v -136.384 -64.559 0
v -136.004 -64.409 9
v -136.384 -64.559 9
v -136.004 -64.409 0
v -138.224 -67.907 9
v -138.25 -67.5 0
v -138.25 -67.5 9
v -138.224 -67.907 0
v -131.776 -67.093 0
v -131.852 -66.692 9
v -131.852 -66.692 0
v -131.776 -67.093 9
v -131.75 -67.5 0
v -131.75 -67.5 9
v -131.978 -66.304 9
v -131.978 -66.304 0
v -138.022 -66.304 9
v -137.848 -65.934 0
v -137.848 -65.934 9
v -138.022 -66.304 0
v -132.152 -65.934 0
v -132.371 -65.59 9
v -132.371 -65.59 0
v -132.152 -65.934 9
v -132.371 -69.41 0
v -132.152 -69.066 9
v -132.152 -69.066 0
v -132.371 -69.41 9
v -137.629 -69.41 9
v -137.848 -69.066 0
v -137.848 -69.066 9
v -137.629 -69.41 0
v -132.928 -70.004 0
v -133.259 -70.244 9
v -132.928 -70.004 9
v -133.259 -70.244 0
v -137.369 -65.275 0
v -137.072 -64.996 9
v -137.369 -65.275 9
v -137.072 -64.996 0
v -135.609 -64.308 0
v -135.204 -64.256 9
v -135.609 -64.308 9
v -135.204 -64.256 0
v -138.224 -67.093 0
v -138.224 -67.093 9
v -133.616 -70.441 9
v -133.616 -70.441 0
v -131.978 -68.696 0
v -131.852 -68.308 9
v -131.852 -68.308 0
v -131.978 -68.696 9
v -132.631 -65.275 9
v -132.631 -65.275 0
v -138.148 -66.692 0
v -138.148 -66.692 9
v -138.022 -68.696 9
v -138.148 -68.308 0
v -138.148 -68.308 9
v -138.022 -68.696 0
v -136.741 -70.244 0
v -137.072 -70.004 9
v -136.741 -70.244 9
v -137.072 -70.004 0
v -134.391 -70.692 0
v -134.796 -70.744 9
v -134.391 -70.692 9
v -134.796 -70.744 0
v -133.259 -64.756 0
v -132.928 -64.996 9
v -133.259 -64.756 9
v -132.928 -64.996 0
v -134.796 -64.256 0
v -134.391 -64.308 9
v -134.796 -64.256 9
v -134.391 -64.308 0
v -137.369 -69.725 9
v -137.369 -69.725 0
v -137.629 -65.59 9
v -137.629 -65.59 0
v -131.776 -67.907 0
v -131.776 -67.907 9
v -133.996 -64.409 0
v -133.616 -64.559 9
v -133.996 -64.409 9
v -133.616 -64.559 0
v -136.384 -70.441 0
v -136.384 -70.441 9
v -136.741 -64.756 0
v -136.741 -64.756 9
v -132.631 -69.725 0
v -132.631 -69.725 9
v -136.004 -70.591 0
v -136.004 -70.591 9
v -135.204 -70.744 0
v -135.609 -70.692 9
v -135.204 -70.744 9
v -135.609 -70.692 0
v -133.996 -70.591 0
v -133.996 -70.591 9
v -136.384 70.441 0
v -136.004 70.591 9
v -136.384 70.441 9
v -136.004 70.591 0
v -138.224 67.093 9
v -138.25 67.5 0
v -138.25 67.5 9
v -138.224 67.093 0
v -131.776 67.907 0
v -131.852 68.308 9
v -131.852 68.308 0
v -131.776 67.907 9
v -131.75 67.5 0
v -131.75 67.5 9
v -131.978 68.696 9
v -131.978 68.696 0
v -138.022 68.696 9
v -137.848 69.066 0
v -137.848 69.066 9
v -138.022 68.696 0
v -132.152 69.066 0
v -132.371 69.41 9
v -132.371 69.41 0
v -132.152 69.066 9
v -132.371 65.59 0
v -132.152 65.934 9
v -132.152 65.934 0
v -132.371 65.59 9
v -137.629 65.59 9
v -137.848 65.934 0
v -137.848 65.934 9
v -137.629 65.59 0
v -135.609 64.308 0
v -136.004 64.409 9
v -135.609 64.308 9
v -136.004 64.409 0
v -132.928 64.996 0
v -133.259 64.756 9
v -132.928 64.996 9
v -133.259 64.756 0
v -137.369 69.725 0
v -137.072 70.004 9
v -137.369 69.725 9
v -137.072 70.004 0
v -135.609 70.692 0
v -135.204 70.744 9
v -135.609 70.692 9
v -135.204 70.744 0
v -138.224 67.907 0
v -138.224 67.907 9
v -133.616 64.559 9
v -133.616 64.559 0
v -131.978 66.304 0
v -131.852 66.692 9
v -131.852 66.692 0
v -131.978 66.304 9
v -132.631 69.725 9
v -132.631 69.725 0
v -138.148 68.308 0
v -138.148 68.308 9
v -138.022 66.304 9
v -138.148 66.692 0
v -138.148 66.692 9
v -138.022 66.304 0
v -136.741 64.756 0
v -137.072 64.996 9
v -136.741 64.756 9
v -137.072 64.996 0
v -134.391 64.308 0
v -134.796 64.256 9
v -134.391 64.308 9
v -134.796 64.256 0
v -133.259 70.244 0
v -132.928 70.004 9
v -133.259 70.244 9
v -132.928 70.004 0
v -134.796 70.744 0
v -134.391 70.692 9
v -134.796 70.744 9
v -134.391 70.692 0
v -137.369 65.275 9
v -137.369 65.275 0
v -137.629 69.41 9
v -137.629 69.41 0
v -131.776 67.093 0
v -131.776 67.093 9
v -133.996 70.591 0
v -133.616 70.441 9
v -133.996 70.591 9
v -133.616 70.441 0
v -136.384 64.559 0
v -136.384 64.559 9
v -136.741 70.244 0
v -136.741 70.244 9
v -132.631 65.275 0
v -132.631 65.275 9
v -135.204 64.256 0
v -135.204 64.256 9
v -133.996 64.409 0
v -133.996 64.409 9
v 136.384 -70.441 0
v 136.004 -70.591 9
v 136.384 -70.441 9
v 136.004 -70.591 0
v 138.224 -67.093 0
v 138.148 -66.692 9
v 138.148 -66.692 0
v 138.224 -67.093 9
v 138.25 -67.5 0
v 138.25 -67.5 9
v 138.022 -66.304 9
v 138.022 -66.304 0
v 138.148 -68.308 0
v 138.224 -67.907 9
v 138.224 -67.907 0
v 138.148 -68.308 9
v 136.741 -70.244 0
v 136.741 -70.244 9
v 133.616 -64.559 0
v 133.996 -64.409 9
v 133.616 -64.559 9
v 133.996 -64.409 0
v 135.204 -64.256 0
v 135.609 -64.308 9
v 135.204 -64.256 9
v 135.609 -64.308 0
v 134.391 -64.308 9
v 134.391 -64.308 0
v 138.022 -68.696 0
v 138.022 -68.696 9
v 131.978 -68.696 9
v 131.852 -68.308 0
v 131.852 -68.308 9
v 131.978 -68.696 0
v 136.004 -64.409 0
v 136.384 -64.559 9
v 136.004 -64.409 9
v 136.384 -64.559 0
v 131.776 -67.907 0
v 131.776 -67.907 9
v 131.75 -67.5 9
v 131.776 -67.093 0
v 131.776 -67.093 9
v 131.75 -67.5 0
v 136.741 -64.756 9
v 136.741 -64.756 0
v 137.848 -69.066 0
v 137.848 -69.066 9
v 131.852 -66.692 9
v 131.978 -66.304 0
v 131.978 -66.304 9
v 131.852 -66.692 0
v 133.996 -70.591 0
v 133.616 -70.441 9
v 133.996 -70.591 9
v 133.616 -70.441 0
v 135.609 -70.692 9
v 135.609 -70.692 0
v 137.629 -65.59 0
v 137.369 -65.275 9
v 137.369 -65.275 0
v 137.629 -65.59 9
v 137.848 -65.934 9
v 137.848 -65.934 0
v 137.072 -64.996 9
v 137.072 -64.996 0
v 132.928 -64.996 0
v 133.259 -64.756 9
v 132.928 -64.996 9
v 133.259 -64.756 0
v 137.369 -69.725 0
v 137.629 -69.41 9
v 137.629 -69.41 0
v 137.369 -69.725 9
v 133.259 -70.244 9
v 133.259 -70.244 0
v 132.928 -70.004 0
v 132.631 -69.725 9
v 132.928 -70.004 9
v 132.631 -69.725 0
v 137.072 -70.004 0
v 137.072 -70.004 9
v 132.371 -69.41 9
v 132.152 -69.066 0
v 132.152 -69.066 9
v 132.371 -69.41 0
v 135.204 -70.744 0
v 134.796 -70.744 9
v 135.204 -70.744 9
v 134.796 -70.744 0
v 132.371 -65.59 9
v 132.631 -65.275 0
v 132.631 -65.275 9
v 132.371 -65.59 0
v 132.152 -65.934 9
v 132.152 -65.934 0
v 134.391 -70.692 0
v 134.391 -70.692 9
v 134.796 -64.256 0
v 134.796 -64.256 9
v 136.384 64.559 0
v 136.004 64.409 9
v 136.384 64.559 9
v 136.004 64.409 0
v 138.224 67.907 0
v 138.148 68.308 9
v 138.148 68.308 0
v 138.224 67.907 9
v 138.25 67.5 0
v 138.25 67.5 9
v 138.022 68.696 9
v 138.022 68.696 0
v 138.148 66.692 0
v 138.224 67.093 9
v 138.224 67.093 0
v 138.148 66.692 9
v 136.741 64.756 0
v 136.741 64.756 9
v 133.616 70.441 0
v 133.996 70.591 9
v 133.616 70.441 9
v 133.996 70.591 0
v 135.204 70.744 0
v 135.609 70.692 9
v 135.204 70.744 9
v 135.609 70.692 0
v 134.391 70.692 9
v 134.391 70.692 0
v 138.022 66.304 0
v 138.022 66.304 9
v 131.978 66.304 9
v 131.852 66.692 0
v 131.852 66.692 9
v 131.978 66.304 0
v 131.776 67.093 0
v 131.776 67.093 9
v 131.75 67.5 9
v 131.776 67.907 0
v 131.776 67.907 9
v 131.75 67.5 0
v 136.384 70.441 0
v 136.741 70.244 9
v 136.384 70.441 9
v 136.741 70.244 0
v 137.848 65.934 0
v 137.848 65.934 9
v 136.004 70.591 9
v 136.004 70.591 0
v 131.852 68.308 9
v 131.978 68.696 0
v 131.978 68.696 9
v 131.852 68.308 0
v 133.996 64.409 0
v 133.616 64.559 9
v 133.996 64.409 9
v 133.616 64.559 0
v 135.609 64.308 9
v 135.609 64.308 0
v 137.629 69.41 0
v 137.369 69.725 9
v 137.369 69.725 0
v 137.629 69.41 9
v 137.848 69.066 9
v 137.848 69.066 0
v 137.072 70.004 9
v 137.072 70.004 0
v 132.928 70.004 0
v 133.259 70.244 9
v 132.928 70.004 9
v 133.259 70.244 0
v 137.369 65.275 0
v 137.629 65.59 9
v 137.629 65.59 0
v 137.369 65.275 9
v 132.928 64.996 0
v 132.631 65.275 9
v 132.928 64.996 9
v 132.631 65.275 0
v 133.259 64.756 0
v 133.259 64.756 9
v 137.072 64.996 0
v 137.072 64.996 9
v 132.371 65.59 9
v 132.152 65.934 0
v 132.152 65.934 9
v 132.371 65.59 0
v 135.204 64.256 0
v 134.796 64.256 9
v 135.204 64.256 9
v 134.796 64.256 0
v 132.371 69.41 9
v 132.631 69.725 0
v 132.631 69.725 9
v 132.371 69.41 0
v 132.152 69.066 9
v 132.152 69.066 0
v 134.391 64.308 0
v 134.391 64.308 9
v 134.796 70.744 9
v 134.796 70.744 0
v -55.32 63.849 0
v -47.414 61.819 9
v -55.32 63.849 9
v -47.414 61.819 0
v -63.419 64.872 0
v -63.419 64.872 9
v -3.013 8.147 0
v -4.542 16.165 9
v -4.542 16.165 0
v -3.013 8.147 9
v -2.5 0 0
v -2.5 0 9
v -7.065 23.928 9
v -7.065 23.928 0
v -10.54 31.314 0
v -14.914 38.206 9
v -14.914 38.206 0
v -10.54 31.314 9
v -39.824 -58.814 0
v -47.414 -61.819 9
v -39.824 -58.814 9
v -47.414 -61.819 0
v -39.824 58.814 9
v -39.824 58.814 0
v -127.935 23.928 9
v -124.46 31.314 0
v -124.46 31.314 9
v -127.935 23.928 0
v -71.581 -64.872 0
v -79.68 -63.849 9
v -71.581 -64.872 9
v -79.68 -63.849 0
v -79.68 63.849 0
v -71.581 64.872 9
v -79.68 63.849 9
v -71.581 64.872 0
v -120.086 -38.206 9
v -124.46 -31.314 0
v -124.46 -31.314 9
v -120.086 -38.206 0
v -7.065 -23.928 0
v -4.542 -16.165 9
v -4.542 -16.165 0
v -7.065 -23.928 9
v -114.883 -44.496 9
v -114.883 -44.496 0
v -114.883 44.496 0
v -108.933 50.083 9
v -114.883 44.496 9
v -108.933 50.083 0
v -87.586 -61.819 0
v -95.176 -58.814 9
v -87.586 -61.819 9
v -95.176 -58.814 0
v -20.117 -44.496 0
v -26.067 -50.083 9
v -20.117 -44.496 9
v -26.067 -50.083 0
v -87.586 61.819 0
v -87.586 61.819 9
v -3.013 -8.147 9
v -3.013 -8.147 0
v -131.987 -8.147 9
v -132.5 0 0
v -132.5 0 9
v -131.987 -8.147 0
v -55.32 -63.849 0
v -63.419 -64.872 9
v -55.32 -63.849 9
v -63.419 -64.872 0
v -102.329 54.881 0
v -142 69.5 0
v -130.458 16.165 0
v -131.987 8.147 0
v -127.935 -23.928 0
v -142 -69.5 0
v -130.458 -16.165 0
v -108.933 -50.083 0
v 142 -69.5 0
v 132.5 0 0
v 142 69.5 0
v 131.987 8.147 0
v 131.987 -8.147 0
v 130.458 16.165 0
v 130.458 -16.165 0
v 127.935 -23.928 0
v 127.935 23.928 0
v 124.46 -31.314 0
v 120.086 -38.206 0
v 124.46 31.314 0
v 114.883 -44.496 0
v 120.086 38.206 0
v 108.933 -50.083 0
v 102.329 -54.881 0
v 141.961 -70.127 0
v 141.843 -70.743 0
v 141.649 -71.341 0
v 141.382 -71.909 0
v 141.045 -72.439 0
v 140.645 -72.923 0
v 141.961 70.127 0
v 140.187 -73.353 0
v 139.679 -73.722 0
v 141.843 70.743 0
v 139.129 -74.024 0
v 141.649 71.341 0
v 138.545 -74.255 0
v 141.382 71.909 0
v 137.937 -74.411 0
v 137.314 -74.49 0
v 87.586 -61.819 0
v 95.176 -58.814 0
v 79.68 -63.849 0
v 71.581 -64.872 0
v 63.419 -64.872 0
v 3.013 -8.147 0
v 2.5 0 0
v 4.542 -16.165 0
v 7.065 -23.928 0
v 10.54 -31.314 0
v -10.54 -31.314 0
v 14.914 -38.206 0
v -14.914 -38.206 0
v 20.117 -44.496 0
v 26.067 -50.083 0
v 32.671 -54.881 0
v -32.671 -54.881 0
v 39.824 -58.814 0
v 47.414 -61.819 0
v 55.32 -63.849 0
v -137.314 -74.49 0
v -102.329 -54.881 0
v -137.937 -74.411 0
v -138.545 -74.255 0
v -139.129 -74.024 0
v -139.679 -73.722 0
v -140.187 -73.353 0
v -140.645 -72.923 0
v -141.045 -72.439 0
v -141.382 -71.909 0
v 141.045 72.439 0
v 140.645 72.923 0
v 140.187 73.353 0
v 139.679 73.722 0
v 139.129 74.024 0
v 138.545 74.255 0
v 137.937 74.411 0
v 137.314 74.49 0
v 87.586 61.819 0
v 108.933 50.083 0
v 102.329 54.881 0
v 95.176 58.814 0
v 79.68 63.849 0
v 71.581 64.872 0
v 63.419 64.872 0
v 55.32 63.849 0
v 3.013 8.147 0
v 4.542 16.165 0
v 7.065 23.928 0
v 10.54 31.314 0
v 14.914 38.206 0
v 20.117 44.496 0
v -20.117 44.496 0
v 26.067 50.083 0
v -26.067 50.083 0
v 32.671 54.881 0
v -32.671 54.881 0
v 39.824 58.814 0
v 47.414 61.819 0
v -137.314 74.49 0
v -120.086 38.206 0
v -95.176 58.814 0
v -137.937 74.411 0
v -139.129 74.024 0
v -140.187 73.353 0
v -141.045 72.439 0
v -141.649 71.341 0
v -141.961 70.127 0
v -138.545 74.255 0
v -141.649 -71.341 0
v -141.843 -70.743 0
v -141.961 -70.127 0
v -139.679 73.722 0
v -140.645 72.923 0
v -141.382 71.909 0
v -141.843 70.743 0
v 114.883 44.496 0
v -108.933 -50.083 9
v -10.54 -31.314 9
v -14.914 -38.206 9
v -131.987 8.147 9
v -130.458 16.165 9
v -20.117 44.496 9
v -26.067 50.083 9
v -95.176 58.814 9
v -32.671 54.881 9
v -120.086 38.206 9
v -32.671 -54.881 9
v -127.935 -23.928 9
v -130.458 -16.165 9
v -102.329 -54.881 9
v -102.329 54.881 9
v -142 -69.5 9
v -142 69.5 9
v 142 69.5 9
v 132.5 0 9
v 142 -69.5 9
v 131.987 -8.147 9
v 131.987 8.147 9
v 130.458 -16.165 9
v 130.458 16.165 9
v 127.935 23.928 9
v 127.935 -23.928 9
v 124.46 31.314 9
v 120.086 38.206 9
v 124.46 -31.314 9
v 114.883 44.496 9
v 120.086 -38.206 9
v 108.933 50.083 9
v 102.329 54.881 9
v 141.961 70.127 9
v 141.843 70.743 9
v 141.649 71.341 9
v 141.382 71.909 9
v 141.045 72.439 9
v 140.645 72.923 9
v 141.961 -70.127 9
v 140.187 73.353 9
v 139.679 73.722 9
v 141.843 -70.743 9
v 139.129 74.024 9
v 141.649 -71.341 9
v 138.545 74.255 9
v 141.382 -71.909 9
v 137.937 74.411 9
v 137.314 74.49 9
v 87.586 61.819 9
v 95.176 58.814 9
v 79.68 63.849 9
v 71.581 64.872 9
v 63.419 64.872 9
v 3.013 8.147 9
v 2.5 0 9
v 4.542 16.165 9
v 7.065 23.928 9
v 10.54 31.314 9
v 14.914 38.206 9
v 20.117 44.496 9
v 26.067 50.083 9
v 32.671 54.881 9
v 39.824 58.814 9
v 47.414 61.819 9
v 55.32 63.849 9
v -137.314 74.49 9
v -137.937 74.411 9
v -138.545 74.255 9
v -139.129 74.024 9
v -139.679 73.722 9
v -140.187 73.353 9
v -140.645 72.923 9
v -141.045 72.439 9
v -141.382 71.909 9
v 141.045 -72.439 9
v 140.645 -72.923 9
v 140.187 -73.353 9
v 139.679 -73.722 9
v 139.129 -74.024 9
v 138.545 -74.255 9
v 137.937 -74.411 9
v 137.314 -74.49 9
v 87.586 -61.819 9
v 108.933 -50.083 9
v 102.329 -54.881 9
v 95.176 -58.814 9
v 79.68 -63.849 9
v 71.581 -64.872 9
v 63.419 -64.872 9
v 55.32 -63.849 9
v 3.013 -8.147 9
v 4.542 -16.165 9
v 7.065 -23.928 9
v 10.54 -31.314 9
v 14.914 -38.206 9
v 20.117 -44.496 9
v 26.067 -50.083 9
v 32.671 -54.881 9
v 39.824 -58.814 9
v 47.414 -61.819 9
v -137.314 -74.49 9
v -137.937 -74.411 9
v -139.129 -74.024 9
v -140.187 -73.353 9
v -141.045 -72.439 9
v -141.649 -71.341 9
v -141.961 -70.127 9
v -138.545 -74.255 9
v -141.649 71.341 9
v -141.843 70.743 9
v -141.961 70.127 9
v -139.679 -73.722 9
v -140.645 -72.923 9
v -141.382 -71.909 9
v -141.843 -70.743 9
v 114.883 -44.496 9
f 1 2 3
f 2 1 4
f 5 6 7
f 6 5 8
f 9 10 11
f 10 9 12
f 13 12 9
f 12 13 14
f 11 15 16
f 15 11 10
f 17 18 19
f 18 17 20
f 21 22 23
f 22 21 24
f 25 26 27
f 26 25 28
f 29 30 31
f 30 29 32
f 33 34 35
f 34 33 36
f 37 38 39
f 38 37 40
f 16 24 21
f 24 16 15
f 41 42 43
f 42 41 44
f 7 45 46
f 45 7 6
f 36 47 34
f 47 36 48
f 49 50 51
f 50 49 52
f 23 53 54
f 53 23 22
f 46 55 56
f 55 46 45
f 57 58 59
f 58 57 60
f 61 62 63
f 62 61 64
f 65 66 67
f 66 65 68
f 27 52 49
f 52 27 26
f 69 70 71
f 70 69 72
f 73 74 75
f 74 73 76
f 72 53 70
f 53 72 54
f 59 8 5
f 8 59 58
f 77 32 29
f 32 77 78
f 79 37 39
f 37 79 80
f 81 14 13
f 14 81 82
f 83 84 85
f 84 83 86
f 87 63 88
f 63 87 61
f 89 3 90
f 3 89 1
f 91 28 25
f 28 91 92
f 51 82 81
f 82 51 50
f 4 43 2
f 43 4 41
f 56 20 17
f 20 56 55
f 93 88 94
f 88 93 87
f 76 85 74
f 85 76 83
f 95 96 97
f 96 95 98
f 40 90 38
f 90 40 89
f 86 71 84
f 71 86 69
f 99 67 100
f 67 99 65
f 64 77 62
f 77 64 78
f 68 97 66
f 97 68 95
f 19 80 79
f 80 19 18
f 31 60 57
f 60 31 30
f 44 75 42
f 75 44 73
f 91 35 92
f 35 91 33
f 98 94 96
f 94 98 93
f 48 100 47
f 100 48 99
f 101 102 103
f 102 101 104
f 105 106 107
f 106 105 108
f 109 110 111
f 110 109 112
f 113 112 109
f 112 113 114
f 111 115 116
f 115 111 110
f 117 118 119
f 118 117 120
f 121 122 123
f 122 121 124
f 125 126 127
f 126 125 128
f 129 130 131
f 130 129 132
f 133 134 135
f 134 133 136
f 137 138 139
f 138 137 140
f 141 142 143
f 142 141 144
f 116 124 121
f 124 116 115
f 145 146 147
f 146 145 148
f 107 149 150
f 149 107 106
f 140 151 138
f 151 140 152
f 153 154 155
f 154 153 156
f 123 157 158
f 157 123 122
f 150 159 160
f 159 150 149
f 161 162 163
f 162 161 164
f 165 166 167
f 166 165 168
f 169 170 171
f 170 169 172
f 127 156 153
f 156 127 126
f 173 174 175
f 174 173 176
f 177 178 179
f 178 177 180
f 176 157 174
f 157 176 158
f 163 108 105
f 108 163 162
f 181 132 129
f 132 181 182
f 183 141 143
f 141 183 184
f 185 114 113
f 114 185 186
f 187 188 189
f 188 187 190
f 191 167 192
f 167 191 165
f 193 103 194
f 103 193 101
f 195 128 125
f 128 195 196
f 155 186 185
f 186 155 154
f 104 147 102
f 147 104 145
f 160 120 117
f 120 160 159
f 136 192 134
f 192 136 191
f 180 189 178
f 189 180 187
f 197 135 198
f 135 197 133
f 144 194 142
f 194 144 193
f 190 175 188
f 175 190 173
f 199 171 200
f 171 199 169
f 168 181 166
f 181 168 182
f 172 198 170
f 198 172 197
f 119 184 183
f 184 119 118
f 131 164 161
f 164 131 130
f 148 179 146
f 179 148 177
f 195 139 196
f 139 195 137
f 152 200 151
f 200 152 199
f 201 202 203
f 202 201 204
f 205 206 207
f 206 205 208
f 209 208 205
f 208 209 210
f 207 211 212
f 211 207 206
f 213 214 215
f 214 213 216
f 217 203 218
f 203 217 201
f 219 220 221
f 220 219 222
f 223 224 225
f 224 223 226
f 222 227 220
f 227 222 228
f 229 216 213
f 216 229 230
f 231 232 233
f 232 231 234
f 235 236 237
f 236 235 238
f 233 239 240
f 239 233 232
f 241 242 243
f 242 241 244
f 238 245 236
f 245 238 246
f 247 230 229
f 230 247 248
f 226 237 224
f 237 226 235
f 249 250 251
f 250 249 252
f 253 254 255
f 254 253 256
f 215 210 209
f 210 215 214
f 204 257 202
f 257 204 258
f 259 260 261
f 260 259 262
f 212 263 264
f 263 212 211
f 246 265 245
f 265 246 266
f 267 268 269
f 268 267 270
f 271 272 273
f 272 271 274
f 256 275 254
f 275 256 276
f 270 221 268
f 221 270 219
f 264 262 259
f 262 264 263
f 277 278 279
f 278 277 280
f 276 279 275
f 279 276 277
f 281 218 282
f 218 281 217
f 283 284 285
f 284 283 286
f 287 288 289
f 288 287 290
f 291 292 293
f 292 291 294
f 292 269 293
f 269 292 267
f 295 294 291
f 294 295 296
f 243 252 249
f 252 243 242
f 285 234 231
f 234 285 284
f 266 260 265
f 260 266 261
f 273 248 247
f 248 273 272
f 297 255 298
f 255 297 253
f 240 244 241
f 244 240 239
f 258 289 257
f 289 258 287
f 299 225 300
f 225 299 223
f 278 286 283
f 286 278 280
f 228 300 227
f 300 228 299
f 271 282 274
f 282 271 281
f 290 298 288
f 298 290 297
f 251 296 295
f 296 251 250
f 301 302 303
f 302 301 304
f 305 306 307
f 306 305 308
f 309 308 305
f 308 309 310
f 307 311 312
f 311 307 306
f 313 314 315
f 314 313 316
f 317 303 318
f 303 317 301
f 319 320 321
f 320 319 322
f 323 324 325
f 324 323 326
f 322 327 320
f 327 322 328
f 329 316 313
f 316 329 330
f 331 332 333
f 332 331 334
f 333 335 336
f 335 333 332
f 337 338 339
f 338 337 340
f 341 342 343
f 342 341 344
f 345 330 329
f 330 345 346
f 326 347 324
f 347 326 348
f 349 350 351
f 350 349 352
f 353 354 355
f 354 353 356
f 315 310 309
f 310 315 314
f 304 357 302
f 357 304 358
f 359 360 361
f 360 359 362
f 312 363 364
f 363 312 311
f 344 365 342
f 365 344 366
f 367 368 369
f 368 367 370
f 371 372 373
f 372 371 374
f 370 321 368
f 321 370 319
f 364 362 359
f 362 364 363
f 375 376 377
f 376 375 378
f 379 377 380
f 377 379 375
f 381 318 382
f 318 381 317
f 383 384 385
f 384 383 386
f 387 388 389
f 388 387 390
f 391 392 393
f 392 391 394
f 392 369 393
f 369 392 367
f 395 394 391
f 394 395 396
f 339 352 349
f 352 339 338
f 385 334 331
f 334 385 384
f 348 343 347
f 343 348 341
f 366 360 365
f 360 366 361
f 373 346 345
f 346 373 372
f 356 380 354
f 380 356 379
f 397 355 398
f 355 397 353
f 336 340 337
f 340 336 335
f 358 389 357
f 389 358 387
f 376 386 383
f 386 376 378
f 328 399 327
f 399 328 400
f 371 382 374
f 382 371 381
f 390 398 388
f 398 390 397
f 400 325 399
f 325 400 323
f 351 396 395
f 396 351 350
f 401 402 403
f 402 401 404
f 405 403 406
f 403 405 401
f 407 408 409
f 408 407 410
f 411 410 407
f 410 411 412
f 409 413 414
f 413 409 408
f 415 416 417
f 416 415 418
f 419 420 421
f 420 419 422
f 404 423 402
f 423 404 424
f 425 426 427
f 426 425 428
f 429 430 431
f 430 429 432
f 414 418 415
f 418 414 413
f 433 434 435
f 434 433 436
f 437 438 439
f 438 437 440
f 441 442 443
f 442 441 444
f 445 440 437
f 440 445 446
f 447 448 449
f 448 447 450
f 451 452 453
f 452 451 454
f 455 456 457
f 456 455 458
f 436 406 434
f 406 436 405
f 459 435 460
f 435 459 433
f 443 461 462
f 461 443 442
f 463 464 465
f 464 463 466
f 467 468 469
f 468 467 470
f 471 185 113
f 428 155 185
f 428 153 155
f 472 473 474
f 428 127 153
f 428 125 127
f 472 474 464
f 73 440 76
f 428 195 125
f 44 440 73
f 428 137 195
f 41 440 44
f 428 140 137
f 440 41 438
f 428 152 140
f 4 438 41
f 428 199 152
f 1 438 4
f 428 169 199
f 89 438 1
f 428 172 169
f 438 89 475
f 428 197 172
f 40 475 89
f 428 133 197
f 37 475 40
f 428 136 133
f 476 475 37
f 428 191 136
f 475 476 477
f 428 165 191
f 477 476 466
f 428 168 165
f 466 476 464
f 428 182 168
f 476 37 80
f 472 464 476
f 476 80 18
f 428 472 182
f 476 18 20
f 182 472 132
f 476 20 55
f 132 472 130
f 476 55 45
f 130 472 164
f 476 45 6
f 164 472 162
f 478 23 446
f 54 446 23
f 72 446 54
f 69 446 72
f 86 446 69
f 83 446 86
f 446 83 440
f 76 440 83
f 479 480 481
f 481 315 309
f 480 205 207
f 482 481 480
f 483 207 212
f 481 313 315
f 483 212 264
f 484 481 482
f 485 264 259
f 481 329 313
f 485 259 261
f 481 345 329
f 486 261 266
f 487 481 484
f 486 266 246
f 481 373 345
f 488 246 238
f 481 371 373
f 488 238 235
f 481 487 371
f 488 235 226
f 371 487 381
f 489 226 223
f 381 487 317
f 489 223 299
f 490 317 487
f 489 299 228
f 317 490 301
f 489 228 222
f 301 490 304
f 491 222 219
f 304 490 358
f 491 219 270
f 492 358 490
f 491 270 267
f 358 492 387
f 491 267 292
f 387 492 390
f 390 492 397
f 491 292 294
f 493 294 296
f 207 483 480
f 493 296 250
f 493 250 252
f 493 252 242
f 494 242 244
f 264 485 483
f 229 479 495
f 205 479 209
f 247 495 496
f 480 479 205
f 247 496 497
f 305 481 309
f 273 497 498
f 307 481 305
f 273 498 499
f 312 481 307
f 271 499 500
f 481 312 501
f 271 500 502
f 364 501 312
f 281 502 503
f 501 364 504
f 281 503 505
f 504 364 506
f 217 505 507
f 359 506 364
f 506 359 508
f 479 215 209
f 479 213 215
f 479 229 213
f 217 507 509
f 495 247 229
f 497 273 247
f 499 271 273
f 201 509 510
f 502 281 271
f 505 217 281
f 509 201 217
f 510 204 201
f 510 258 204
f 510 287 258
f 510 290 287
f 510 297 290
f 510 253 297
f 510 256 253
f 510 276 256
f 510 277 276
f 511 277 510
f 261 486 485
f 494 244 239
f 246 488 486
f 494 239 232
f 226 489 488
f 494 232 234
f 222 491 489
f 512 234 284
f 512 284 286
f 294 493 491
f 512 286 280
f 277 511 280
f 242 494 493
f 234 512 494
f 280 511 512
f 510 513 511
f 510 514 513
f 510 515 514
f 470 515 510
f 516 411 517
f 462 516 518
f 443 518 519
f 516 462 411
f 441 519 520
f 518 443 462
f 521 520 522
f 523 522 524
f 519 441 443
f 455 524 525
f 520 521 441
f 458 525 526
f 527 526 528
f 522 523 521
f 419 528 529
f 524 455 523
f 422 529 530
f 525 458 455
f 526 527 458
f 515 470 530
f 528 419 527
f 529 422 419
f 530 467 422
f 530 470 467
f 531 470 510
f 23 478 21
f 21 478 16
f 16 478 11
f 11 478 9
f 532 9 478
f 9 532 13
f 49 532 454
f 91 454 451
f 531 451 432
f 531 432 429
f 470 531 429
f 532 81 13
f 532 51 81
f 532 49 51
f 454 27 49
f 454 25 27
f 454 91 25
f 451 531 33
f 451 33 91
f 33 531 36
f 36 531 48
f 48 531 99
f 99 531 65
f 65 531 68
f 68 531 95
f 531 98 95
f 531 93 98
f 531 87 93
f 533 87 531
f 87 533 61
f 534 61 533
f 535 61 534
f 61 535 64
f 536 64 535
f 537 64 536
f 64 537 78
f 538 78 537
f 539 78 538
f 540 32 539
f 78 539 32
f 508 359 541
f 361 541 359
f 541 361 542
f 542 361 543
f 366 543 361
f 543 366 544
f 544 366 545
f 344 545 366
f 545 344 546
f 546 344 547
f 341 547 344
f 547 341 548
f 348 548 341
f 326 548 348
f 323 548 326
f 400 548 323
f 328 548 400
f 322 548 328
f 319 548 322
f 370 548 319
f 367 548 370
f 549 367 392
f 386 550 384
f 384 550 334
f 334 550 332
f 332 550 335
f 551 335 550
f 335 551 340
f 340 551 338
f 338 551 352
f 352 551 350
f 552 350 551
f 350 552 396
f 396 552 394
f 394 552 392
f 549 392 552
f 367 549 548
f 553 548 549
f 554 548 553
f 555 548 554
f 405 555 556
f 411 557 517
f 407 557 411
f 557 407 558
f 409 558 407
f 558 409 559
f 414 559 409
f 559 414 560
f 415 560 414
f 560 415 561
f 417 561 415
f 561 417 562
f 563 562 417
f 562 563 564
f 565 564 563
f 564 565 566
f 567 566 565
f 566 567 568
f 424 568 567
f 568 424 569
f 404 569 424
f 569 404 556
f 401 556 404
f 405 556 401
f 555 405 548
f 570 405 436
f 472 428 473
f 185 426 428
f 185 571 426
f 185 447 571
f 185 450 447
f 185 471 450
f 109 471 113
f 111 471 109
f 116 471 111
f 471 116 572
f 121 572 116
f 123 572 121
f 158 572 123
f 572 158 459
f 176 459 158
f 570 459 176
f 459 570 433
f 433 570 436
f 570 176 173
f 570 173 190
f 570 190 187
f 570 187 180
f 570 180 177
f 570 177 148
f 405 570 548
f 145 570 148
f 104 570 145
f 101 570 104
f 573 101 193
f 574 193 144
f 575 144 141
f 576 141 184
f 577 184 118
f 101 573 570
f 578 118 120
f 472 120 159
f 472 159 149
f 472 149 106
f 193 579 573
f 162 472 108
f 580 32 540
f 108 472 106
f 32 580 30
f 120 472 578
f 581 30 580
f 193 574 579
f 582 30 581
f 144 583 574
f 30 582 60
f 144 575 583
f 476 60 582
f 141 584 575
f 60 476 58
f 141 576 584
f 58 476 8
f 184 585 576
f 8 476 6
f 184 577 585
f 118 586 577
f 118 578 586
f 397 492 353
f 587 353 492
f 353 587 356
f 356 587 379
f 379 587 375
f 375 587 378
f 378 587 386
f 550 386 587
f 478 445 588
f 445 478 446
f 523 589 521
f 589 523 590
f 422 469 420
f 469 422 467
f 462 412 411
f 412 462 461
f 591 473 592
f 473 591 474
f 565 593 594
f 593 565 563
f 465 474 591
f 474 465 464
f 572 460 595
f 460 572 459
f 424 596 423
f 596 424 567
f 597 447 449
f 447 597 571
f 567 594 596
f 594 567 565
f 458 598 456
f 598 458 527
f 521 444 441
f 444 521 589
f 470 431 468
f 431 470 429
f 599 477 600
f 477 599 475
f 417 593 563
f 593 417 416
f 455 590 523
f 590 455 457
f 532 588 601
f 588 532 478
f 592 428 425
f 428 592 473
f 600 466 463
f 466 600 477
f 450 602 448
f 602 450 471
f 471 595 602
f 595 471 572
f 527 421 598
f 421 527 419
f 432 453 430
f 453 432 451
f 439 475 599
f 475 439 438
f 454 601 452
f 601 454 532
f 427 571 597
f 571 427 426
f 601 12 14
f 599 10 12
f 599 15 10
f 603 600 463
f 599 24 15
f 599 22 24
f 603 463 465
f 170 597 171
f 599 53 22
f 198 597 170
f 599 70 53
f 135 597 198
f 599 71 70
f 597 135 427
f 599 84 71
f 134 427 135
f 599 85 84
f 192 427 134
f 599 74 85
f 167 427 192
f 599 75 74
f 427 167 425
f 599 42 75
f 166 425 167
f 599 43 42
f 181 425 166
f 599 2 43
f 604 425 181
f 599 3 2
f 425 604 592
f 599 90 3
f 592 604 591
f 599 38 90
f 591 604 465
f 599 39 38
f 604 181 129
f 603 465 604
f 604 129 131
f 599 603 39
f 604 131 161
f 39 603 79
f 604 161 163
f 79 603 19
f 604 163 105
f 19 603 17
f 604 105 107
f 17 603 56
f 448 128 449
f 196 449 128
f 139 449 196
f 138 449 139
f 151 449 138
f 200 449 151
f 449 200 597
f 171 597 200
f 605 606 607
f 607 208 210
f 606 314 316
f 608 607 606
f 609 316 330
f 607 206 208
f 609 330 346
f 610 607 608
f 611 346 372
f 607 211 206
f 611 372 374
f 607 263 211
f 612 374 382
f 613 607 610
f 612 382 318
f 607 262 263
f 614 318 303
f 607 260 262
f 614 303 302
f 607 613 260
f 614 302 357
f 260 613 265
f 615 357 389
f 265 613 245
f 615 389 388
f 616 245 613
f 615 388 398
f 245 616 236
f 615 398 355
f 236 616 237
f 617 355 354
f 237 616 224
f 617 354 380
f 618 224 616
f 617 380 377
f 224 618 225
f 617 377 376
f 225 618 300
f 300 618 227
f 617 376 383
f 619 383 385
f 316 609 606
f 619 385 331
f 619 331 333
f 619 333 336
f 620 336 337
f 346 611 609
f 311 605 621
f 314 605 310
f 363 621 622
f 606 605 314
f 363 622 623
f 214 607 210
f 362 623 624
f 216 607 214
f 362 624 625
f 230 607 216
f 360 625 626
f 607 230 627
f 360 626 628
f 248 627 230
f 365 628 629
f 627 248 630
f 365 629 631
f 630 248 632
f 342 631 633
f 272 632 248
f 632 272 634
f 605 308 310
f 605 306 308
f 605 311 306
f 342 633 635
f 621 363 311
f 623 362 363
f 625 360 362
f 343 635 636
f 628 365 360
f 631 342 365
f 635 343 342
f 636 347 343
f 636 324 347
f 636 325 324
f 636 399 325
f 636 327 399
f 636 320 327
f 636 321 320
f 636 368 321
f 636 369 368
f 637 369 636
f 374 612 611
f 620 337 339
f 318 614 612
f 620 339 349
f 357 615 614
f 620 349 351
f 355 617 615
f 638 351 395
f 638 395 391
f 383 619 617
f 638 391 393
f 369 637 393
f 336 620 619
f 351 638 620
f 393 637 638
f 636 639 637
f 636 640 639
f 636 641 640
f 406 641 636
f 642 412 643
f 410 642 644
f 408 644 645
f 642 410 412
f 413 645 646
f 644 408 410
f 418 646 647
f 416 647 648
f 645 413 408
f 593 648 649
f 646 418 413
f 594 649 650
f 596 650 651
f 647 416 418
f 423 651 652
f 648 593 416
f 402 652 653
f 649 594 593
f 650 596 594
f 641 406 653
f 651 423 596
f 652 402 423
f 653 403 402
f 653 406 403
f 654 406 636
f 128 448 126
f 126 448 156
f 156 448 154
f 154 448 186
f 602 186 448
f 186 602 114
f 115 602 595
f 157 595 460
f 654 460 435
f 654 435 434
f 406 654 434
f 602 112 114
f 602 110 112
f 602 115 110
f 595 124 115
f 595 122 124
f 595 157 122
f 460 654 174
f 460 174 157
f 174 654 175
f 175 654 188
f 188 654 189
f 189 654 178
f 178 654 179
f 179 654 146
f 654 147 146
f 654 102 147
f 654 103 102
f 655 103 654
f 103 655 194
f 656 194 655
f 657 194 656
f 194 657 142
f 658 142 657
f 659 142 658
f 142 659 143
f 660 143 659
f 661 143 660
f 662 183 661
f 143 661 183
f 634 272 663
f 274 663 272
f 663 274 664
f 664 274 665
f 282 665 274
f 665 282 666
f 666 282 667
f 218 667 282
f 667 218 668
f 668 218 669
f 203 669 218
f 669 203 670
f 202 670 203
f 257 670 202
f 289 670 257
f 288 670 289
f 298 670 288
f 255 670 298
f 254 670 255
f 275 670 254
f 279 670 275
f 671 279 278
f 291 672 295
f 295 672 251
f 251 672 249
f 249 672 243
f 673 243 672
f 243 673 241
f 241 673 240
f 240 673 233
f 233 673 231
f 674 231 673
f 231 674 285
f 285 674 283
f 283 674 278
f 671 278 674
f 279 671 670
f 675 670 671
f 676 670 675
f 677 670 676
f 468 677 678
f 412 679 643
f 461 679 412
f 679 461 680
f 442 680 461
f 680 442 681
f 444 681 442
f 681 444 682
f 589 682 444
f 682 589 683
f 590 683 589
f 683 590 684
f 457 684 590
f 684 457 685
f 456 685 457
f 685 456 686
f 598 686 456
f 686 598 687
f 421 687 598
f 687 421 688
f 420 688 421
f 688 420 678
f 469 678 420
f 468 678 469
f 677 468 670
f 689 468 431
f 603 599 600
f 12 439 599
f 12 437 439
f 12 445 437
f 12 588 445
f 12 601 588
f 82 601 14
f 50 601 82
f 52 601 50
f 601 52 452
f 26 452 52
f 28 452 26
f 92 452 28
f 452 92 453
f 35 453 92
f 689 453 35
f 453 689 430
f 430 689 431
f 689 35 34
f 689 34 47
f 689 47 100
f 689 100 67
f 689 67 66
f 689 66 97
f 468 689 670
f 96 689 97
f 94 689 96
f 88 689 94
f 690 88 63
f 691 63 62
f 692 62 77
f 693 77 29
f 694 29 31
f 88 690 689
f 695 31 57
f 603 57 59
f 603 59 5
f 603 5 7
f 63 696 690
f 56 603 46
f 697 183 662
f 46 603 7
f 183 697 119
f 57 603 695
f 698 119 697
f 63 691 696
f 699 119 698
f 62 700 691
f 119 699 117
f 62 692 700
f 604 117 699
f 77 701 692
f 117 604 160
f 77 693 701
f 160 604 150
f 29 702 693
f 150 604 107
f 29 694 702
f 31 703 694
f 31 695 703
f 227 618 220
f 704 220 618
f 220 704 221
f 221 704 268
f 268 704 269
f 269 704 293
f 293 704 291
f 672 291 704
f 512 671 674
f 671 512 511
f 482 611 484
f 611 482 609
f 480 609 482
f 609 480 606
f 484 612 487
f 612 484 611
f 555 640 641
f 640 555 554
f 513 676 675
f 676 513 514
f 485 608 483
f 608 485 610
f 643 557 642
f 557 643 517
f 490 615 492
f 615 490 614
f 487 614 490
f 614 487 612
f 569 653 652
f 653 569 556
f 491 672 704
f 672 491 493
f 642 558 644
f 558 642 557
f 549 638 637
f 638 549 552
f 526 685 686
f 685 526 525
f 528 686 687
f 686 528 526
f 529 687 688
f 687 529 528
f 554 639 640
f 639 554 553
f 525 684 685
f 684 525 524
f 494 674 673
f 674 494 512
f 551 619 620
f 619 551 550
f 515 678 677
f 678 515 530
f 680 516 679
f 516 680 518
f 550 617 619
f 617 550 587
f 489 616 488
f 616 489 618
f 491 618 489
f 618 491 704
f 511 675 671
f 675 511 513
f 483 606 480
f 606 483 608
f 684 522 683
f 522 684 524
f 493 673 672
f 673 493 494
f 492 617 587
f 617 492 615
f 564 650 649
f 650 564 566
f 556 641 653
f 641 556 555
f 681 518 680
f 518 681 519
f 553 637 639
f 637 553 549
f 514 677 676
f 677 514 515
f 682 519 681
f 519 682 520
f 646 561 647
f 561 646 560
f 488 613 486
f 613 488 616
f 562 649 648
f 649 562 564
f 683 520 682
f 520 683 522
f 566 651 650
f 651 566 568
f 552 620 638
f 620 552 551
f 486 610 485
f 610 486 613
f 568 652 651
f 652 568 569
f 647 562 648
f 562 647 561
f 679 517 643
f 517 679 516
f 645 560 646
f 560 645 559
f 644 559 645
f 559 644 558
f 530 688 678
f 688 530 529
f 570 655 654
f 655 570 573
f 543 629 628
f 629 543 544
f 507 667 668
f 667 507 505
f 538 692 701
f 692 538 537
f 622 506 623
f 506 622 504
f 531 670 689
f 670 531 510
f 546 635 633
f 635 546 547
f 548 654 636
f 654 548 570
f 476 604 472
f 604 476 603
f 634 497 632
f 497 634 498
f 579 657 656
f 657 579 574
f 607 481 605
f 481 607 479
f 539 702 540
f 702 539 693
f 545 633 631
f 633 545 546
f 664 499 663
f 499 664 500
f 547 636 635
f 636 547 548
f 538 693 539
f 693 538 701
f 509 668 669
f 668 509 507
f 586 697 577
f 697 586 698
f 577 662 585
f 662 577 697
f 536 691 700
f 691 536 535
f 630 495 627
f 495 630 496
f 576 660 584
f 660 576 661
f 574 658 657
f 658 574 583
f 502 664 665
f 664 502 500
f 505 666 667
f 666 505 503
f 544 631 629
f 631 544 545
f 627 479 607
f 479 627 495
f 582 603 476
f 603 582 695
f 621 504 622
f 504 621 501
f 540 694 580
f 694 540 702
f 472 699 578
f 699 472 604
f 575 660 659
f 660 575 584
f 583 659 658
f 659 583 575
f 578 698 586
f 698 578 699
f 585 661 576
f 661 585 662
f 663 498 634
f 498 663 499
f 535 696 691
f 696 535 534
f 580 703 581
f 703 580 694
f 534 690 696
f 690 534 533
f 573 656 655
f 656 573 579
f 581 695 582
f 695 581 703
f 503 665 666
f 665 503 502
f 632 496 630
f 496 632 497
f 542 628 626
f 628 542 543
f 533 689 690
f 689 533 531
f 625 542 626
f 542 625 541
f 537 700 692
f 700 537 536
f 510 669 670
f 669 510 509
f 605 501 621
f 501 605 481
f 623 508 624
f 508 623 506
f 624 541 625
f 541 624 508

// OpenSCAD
$fn = 50;

difference() {
	union() {
		hull() {
			translate(v = [-137.0, 69.5, 0]) {
				cylinder(h = 9, r = 5);
			}
			translate(v = [137.0, 69.5, 0]) {
				cylinder(h = 9, r = 5);
			}
			translate(v = [-137.0, -69.5, 0]) {
				cylinder(h = 9, r = 5);
			}
			translate(v = [137.0, -69.5, 0]) {
				cylinder(h = 9, r = 5);
			}
		}
	}
	union() {
		translate(v = [-135.0, -67.5, -100.0]) {
			cylinder(h = 200, r = 3.25);
		}
		translate(v = [-135.0, 67.5, -100.0]) {
			cylinder(h = 200, r = 3.25);
		}
		translate(v = [135.0, -67.5, -100.0]) {
			cylinder(h = 200, r = 3.25);
		}
		translate(v = [135.0, 67.5, -100.0]) {
			cylinder(h = 200, r = 3.25);
		}
		translate(v = [-135.0, -67.5, -100.0]) {
			cylinder(h = 200, r = 1.8);
		}
		translate(v = [-135.0, 67.5, -100.0]) {
			cylinder(h = 200, r = 1.8);
		}
		translate(v = [135.0, -67.5, -100.0]) {
			cylinder(h = 200, r = 1.8);
		}
		translate(v = [135.0, 67.5, -100.0]) {
			cylinder(h = 200, r = 1.8);
		}
		translate(v = [-67.5, 0, 0.0]) {
			cylinder(h = 9, r = 65.0);
		}
		translate(v = [67.5, 0, 0.0]) {
			cylinder(h = 9, r = 65.0);
		}
	}
}
